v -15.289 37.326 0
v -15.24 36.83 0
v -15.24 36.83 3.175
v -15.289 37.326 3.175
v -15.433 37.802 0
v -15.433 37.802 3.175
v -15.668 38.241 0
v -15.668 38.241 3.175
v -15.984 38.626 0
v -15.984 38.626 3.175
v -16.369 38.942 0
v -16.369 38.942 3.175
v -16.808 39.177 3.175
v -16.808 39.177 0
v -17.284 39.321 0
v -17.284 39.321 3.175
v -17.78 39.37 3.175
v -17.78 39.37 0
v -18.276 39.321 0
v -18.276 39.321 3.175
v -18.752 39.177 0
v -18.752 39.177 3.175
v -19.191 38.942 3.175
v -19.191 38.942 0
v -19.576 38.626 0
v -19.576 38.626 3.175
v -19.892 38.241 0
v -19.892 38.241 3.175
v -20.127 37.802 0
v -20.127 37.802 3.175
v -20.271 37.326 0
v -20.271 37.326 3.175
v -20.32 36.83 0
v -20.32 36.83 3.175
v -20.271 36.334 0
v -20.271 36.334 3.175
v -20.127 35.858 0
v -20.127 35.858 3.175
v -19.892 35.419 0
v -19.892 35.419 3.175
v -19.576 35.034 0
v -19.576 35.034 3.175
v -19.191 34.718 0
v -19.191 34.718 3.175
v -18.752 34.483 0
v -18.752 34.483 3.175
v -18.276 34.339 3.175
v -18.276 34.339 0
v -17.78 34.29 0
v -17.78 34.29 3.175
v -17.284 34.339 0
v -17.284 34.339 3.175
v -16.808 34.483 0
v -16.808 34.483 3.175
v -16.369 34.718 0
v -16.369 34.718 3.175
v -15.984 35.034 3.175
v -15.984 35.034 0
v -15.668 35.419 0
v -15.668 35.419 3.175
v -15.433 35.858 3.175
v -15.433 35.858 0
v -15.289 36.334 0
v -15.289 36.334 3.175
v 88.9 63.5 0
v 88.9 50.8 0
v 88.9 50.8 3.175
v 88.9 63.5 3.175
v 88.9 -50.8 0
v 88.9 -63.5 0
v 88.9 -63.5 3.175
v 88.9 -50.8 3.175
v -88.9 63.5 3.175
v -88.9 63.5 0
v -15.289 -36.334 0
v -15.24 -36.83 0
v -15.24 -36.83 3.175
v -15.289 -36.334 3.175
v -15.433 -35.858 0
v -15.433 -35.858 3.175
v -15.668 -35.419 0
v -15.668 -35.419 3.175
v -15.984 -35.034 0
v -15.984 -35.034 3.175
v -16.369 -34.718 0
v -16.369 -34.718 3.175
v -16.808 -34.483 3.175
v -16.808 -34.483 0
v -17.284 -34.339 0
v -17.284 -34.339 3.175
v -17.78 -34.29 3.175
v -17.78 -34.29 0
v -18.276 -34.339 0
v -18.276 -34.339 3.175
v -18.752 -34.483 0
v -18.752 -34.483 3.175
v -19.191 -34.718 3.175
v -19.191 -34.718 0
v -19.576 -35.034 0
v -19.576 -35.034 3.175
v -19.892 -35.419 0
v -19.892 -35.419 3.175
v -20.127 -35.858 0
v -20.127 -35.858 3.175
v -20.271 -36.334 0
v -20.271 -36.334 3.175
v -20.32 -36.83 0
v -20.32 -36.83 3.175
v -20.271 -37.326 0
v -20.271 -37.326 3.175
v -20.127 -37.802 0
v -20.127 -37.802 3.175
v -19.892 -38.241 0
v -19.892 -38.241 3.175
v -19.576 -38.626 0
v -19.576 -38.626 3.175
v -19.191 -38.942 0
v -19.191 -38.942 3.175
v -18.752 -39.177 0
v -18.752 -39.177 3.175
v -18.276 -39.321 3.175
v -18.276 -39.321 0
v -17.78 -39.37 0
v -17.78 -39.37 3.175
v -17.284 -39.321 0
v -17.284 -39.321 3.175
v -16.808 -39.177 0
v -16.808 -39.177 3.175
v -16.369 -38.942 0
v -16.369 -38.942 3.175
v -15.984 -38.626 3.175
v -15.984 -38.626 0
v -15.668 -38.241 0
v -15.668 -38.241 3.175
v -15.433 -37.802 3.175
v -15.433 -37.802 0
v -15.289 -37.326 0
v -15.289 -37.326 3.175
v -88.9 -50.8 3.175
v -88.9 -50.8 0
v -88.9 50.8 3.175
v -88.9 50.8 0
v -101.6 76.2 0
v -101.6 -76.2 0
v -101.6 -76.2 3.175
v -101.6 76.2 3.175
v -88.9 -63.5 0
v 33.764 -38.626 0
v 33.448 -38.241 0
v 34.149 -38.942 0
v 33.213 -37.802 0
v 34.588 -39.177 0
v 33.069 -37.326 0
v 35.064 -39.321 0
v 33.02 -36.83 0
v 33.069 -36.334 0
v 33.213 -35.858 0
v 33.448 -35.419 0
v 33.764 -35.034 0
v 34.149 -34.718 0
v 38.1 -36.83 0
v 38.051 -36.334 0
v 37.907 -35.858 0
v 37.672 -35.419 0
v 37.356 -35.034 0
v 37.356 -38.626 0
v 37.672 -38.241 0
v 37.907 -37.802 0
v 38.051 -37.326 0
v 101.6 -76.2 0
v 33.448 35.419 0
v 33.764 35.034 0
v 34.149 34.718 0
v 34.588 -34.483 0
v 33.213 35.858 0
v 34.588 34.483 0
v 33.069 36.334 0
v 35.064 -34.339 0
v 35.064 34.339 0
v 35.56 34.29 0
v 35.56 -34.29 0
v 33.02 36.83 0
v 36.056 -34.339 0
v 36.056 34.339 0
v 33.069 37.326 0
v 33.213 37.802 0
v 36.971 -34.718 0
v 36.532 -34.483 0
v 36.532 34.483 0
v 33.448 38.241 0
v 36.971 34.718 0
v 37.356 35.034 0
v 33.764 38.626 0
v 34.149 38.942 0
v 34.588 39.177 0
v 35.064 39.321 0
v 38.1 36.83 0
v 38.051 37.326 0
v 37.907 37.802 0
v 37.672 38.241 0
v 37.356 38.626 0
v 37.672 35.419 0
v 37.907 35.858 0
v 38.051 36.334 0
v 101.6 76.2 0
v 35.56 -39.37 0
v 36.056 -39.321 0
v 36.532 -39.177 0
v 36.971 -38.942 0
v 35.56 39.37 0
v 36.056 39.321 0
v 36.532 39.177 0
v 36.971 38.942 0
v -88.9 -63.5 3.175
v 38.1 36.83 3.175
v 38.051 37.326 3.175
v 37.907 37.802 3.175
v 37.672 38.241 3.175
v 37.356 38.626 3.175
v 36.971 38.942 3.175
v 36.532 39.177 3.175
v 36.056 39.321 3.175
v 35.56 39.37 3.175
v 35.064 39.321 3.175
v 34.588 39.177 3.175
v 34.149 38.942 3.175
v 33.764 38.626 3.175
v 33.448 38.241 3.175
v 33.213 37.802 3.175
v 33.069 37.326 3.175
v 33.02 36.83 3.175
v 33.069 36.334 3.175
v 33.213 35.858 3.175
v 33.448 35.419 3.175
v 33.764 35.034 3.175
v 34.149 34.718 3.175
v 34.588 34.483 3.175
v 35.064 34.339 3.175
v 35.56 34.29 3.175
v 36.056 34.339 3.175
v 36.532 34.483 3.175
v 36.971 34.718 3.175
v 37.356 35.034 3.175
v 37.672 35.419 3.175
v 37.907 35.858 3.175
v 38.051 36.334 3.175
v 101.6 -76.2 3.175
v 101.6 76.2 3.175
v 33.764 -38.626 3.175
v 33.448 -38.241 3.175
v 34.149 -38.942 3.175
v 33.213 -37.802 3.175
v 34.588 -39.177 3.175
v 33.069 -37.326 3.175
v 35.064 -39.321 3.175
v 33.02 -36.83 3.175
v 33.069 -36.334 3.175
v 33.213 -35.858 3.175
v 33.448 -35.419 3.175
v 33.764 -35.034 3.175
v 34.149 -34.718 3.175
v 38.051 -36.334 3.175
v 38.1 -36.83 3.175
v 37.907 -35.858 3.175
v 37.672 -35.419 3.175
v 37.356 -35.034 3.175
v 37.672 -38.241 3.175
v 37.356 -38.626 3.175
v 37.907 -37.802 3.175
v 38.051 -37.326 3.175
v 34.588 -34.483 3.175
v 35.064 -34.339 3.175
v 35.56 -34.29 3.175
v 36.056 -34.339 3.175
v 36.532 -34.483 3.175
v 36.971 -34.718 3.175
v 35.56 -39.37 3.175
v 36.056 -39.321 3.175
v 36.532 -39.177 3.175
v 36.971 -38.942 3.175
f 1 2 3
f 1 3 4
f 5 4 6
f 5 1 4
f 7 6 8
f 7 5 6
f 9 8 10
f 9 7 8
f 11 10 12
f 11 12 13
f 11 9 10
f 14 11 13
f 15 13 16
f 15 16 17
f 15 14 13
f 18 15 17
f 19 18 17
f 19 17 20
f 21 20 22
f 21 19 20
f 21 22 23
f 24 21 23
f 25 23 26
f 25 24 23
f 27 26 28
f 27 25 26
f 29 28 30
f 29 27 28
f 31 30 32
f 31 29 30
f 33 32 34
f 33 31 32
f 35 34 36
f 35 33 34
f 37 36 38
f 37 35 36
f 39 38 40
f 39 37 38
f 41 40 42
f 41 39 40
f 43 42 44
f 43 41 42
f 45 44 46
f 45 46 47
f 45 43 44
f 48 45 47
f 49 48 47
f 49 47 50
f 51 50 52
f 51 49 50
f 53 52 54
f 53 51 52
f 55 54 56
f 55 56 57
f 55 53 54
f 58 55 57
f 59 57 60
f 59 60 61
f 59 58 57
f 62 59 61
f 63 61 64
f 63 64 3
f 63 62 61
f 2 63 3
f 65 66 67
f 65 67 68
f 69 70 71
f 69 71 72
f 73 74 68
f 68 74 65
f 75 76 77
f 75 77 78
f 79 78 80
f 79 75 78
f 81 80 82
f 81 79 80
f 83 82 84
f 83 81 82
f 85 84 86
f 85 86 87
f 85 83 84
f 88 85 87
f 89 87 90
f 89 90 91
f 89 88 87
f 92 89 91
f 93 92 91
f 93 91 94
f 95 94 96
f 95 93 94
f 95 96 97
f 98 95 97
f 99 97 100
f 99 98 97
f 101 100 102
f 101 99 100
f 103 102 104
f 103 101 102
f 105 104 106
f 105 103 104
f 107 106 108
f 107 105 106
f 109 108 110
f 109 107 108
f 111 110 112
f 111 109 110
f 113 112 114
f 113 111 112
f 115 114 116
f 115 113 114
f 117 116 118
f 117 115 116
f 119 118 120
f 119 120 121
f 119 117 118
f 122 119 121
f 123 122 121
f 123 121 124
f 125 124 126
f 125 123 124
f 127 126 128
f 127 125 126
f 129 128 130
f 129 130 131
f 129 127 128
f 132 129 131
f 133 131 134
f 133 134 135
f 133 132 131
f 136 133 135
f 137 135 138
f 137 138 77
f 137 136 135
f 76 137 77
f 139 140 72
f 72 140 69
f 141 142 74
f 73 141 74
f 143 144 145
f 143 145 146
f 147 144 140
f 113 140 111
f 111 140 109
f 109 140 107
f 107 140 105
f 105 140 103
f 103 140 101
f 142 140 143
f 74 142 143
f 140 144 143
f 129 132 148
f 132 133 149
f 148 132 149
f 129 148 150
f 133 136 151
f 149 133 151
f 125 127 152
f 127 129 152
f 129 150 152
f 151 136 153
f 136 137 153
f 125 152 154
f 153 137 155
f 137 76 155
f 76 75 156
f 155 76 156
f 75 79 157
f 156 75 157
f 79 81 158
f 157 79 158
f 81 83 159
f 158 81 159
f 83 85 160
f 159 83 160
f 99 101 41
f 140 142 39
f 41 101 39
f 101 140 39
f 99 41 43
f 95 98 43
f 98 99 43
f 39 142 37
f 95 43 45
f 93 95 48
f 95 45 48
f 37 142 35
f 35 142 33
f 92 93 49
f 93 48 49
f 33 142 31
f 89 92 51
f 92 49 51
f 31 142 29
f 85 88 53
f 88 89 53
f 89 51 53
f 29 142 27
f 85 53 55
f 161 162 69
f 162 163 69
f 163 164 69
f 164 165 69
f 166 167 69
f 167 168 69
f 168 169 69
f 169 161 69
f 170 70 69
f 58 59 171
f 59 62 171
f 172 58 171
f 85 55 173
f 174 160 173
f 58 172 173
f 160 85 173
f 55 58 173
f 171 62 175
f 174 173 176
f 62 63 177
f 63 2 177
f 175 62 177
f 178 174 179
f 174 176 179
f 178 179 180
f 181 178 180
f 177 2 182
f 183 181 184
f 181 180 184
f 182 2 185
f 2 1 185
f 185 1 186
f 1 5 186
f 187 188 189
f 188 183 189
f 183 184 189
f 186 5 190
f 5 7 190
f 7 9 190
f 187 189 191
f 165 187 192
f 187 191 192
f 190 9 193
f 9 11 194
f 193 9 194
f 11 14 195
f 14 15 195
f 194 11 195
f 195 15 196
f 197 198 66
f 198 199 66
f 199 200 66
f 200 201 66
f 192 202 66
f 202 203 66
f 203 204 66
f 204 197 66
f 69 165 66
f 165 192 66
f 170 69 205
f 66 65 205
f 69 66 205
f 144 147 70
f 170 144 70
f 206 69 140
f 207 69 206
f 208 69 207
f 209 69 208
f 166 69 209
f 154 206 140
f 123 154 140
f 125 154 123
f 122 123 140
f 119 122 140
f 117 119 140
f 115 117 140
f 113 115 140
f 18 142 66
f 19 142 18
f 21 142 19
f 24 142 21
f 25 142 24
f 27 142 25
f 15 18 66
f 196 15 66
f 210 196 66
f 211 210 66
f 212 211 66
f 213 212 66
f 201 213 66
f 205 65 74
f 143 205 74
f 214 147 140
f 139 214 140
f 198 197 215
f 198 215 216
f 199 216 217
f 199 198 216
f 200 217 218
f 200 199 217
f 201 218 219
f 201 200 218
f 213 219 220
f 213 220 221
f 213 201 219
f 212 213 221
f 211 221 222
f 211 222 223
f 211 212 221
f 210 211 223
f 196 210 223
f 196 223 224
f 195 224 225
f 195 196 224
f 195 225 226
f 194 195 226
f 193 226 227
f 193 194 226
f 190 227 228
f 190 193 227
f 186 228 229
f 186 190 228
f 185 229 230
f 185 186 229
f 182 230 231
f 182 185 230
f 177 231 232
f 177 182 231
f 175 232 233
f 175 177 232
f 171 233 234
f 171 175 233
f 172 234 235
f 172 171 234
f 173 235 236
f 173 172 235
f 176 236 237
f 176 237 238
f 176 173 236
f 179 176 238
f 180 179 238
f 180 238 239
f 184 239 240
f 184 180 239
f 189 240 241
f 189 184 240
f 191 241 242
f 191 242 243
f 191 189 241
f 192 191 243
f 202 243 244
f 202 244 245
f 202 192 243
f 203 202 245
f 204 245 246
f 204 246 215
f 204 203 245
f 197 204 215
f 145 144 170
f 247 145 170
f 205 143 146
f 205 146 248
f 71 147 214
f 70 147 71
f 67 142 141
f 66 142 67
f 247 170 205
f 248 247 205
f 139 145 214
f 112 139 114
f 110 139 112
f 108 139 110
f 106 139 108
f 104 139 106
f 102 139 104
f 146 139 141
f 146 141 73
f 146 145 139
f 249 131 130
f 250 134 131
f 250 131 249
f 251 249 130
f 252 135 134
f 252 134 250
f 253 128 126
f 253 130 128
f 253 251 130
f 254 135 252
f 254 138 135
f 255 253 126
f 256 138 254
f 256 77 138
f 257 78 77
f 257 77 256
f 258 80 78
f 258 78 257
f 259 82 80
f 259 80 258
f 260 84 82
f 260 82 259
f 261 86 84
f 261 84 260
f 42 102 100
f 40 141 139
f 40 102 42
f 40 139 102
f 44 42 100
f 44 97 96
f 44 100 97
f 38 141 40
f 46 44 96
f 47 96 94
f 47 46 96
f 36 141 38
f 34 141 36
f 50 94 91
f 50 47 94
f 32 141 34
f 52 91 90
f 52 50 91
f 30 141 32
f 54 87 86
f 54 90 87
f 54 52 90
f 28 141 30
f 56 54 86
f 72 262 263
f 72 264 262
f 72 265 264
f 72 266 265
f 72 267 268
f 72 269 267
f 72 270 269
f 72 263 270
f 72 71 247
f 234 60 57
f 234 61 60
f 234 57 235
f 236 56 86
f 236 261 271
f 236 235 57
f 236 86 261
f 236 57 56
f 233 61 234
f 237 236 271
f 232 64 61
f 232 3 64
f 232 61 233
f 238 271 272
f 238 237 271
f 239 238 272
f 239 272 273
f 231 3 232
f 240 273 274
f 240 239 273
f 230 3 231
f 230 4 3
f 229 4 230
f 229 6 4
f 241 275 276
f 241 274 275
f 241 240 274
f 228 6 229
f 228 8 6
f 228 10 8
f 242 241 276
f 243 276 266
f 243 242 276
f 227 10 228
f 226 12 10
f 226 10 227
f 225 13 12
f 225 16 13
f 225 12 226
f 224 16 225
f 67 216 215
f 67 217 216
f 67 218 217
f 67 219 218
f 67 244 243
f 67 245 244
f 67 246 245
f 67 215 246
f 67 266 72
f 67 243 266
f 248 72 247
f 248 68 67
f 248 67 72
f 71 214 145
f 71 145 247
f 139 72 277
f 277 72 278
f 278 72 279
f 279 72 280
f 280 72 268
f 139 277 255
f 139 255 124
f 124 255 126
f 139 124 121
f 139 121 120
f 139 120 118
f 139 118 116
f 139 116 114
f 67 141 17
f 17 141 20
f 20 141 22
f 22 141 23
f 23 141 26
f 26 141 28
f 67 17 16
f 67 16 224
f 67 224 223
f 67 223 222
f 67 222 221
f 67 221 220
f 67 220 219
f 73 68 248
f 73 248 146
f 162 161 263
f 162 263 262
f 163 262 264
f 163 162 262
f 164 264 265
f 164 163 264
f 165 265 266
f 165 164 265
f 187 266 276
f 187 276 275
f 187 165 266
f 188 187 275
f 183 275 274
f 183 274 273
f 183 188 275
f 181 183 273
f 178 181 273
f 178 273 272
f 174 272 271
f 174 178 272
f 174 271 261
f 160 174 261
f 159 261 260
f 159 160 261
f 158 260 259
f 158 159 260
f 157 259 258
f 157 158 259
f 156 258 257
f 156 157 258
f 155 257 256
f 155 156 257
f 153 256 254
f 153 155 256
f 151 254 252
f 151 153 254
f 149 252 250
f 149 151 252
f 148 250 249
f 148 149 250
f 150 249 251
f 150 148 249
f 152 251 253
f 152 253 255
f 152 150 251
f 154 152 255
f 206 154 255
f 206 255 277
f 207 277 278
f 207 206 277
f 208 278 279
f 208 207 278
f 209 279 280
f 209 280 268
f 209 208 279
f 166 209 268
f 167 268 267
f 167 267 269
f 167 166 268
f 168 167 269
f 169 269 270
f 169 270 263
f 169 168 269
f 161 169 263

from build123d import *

# Parameters (mm, degrees)
F0_W     = 203.2
F0_H     = 152.4
F0_W_2   = 177.8
F0_H_2   = 12.7
F0_R     = 2.54
F1_DEPTH = 3.175


# Not quite as in the source:
# - a length typed as a fraction of an inch, garbled in the dataset ("3 / 203.2 mm" for 3/8 in), is restored
# - a feature names something its author has since deleted; it is built from what else it names


with BuildPart() as f1:
    # F0 (on Top) → F1 (new body)
    with BuildSketch(Plane.XY):
        Rectangle(F0_W, F0_H)
        with Locations((0, -57.15)):
            Rectangle(F0_W_2, F0_H_2, mode=Mode.SUBTRACT)
        with Locations((-17.78, -36.83)):
            Circle(F0_R, mode=Mode.SUBTRACT)
        with Locations((35.56, -36.83)):
            Circle(F0_R, mode=Mode.SUBTRACT)
        with Locations((-17.78, 36.83)):
            Circle(F0_R, mode=Mode.SUBTRACT)
        with Locations((0, 57.15)):
            Rectangle(F0_W_2, F0_H_2, mode=Mode.SUBTRACT)
        with Locations((35.56, 36.83)):
            Circle(F0_R, mode=Mode.SUBTRACT)
    extrude(amount=F1_DEPTH)


solid = f1.part
